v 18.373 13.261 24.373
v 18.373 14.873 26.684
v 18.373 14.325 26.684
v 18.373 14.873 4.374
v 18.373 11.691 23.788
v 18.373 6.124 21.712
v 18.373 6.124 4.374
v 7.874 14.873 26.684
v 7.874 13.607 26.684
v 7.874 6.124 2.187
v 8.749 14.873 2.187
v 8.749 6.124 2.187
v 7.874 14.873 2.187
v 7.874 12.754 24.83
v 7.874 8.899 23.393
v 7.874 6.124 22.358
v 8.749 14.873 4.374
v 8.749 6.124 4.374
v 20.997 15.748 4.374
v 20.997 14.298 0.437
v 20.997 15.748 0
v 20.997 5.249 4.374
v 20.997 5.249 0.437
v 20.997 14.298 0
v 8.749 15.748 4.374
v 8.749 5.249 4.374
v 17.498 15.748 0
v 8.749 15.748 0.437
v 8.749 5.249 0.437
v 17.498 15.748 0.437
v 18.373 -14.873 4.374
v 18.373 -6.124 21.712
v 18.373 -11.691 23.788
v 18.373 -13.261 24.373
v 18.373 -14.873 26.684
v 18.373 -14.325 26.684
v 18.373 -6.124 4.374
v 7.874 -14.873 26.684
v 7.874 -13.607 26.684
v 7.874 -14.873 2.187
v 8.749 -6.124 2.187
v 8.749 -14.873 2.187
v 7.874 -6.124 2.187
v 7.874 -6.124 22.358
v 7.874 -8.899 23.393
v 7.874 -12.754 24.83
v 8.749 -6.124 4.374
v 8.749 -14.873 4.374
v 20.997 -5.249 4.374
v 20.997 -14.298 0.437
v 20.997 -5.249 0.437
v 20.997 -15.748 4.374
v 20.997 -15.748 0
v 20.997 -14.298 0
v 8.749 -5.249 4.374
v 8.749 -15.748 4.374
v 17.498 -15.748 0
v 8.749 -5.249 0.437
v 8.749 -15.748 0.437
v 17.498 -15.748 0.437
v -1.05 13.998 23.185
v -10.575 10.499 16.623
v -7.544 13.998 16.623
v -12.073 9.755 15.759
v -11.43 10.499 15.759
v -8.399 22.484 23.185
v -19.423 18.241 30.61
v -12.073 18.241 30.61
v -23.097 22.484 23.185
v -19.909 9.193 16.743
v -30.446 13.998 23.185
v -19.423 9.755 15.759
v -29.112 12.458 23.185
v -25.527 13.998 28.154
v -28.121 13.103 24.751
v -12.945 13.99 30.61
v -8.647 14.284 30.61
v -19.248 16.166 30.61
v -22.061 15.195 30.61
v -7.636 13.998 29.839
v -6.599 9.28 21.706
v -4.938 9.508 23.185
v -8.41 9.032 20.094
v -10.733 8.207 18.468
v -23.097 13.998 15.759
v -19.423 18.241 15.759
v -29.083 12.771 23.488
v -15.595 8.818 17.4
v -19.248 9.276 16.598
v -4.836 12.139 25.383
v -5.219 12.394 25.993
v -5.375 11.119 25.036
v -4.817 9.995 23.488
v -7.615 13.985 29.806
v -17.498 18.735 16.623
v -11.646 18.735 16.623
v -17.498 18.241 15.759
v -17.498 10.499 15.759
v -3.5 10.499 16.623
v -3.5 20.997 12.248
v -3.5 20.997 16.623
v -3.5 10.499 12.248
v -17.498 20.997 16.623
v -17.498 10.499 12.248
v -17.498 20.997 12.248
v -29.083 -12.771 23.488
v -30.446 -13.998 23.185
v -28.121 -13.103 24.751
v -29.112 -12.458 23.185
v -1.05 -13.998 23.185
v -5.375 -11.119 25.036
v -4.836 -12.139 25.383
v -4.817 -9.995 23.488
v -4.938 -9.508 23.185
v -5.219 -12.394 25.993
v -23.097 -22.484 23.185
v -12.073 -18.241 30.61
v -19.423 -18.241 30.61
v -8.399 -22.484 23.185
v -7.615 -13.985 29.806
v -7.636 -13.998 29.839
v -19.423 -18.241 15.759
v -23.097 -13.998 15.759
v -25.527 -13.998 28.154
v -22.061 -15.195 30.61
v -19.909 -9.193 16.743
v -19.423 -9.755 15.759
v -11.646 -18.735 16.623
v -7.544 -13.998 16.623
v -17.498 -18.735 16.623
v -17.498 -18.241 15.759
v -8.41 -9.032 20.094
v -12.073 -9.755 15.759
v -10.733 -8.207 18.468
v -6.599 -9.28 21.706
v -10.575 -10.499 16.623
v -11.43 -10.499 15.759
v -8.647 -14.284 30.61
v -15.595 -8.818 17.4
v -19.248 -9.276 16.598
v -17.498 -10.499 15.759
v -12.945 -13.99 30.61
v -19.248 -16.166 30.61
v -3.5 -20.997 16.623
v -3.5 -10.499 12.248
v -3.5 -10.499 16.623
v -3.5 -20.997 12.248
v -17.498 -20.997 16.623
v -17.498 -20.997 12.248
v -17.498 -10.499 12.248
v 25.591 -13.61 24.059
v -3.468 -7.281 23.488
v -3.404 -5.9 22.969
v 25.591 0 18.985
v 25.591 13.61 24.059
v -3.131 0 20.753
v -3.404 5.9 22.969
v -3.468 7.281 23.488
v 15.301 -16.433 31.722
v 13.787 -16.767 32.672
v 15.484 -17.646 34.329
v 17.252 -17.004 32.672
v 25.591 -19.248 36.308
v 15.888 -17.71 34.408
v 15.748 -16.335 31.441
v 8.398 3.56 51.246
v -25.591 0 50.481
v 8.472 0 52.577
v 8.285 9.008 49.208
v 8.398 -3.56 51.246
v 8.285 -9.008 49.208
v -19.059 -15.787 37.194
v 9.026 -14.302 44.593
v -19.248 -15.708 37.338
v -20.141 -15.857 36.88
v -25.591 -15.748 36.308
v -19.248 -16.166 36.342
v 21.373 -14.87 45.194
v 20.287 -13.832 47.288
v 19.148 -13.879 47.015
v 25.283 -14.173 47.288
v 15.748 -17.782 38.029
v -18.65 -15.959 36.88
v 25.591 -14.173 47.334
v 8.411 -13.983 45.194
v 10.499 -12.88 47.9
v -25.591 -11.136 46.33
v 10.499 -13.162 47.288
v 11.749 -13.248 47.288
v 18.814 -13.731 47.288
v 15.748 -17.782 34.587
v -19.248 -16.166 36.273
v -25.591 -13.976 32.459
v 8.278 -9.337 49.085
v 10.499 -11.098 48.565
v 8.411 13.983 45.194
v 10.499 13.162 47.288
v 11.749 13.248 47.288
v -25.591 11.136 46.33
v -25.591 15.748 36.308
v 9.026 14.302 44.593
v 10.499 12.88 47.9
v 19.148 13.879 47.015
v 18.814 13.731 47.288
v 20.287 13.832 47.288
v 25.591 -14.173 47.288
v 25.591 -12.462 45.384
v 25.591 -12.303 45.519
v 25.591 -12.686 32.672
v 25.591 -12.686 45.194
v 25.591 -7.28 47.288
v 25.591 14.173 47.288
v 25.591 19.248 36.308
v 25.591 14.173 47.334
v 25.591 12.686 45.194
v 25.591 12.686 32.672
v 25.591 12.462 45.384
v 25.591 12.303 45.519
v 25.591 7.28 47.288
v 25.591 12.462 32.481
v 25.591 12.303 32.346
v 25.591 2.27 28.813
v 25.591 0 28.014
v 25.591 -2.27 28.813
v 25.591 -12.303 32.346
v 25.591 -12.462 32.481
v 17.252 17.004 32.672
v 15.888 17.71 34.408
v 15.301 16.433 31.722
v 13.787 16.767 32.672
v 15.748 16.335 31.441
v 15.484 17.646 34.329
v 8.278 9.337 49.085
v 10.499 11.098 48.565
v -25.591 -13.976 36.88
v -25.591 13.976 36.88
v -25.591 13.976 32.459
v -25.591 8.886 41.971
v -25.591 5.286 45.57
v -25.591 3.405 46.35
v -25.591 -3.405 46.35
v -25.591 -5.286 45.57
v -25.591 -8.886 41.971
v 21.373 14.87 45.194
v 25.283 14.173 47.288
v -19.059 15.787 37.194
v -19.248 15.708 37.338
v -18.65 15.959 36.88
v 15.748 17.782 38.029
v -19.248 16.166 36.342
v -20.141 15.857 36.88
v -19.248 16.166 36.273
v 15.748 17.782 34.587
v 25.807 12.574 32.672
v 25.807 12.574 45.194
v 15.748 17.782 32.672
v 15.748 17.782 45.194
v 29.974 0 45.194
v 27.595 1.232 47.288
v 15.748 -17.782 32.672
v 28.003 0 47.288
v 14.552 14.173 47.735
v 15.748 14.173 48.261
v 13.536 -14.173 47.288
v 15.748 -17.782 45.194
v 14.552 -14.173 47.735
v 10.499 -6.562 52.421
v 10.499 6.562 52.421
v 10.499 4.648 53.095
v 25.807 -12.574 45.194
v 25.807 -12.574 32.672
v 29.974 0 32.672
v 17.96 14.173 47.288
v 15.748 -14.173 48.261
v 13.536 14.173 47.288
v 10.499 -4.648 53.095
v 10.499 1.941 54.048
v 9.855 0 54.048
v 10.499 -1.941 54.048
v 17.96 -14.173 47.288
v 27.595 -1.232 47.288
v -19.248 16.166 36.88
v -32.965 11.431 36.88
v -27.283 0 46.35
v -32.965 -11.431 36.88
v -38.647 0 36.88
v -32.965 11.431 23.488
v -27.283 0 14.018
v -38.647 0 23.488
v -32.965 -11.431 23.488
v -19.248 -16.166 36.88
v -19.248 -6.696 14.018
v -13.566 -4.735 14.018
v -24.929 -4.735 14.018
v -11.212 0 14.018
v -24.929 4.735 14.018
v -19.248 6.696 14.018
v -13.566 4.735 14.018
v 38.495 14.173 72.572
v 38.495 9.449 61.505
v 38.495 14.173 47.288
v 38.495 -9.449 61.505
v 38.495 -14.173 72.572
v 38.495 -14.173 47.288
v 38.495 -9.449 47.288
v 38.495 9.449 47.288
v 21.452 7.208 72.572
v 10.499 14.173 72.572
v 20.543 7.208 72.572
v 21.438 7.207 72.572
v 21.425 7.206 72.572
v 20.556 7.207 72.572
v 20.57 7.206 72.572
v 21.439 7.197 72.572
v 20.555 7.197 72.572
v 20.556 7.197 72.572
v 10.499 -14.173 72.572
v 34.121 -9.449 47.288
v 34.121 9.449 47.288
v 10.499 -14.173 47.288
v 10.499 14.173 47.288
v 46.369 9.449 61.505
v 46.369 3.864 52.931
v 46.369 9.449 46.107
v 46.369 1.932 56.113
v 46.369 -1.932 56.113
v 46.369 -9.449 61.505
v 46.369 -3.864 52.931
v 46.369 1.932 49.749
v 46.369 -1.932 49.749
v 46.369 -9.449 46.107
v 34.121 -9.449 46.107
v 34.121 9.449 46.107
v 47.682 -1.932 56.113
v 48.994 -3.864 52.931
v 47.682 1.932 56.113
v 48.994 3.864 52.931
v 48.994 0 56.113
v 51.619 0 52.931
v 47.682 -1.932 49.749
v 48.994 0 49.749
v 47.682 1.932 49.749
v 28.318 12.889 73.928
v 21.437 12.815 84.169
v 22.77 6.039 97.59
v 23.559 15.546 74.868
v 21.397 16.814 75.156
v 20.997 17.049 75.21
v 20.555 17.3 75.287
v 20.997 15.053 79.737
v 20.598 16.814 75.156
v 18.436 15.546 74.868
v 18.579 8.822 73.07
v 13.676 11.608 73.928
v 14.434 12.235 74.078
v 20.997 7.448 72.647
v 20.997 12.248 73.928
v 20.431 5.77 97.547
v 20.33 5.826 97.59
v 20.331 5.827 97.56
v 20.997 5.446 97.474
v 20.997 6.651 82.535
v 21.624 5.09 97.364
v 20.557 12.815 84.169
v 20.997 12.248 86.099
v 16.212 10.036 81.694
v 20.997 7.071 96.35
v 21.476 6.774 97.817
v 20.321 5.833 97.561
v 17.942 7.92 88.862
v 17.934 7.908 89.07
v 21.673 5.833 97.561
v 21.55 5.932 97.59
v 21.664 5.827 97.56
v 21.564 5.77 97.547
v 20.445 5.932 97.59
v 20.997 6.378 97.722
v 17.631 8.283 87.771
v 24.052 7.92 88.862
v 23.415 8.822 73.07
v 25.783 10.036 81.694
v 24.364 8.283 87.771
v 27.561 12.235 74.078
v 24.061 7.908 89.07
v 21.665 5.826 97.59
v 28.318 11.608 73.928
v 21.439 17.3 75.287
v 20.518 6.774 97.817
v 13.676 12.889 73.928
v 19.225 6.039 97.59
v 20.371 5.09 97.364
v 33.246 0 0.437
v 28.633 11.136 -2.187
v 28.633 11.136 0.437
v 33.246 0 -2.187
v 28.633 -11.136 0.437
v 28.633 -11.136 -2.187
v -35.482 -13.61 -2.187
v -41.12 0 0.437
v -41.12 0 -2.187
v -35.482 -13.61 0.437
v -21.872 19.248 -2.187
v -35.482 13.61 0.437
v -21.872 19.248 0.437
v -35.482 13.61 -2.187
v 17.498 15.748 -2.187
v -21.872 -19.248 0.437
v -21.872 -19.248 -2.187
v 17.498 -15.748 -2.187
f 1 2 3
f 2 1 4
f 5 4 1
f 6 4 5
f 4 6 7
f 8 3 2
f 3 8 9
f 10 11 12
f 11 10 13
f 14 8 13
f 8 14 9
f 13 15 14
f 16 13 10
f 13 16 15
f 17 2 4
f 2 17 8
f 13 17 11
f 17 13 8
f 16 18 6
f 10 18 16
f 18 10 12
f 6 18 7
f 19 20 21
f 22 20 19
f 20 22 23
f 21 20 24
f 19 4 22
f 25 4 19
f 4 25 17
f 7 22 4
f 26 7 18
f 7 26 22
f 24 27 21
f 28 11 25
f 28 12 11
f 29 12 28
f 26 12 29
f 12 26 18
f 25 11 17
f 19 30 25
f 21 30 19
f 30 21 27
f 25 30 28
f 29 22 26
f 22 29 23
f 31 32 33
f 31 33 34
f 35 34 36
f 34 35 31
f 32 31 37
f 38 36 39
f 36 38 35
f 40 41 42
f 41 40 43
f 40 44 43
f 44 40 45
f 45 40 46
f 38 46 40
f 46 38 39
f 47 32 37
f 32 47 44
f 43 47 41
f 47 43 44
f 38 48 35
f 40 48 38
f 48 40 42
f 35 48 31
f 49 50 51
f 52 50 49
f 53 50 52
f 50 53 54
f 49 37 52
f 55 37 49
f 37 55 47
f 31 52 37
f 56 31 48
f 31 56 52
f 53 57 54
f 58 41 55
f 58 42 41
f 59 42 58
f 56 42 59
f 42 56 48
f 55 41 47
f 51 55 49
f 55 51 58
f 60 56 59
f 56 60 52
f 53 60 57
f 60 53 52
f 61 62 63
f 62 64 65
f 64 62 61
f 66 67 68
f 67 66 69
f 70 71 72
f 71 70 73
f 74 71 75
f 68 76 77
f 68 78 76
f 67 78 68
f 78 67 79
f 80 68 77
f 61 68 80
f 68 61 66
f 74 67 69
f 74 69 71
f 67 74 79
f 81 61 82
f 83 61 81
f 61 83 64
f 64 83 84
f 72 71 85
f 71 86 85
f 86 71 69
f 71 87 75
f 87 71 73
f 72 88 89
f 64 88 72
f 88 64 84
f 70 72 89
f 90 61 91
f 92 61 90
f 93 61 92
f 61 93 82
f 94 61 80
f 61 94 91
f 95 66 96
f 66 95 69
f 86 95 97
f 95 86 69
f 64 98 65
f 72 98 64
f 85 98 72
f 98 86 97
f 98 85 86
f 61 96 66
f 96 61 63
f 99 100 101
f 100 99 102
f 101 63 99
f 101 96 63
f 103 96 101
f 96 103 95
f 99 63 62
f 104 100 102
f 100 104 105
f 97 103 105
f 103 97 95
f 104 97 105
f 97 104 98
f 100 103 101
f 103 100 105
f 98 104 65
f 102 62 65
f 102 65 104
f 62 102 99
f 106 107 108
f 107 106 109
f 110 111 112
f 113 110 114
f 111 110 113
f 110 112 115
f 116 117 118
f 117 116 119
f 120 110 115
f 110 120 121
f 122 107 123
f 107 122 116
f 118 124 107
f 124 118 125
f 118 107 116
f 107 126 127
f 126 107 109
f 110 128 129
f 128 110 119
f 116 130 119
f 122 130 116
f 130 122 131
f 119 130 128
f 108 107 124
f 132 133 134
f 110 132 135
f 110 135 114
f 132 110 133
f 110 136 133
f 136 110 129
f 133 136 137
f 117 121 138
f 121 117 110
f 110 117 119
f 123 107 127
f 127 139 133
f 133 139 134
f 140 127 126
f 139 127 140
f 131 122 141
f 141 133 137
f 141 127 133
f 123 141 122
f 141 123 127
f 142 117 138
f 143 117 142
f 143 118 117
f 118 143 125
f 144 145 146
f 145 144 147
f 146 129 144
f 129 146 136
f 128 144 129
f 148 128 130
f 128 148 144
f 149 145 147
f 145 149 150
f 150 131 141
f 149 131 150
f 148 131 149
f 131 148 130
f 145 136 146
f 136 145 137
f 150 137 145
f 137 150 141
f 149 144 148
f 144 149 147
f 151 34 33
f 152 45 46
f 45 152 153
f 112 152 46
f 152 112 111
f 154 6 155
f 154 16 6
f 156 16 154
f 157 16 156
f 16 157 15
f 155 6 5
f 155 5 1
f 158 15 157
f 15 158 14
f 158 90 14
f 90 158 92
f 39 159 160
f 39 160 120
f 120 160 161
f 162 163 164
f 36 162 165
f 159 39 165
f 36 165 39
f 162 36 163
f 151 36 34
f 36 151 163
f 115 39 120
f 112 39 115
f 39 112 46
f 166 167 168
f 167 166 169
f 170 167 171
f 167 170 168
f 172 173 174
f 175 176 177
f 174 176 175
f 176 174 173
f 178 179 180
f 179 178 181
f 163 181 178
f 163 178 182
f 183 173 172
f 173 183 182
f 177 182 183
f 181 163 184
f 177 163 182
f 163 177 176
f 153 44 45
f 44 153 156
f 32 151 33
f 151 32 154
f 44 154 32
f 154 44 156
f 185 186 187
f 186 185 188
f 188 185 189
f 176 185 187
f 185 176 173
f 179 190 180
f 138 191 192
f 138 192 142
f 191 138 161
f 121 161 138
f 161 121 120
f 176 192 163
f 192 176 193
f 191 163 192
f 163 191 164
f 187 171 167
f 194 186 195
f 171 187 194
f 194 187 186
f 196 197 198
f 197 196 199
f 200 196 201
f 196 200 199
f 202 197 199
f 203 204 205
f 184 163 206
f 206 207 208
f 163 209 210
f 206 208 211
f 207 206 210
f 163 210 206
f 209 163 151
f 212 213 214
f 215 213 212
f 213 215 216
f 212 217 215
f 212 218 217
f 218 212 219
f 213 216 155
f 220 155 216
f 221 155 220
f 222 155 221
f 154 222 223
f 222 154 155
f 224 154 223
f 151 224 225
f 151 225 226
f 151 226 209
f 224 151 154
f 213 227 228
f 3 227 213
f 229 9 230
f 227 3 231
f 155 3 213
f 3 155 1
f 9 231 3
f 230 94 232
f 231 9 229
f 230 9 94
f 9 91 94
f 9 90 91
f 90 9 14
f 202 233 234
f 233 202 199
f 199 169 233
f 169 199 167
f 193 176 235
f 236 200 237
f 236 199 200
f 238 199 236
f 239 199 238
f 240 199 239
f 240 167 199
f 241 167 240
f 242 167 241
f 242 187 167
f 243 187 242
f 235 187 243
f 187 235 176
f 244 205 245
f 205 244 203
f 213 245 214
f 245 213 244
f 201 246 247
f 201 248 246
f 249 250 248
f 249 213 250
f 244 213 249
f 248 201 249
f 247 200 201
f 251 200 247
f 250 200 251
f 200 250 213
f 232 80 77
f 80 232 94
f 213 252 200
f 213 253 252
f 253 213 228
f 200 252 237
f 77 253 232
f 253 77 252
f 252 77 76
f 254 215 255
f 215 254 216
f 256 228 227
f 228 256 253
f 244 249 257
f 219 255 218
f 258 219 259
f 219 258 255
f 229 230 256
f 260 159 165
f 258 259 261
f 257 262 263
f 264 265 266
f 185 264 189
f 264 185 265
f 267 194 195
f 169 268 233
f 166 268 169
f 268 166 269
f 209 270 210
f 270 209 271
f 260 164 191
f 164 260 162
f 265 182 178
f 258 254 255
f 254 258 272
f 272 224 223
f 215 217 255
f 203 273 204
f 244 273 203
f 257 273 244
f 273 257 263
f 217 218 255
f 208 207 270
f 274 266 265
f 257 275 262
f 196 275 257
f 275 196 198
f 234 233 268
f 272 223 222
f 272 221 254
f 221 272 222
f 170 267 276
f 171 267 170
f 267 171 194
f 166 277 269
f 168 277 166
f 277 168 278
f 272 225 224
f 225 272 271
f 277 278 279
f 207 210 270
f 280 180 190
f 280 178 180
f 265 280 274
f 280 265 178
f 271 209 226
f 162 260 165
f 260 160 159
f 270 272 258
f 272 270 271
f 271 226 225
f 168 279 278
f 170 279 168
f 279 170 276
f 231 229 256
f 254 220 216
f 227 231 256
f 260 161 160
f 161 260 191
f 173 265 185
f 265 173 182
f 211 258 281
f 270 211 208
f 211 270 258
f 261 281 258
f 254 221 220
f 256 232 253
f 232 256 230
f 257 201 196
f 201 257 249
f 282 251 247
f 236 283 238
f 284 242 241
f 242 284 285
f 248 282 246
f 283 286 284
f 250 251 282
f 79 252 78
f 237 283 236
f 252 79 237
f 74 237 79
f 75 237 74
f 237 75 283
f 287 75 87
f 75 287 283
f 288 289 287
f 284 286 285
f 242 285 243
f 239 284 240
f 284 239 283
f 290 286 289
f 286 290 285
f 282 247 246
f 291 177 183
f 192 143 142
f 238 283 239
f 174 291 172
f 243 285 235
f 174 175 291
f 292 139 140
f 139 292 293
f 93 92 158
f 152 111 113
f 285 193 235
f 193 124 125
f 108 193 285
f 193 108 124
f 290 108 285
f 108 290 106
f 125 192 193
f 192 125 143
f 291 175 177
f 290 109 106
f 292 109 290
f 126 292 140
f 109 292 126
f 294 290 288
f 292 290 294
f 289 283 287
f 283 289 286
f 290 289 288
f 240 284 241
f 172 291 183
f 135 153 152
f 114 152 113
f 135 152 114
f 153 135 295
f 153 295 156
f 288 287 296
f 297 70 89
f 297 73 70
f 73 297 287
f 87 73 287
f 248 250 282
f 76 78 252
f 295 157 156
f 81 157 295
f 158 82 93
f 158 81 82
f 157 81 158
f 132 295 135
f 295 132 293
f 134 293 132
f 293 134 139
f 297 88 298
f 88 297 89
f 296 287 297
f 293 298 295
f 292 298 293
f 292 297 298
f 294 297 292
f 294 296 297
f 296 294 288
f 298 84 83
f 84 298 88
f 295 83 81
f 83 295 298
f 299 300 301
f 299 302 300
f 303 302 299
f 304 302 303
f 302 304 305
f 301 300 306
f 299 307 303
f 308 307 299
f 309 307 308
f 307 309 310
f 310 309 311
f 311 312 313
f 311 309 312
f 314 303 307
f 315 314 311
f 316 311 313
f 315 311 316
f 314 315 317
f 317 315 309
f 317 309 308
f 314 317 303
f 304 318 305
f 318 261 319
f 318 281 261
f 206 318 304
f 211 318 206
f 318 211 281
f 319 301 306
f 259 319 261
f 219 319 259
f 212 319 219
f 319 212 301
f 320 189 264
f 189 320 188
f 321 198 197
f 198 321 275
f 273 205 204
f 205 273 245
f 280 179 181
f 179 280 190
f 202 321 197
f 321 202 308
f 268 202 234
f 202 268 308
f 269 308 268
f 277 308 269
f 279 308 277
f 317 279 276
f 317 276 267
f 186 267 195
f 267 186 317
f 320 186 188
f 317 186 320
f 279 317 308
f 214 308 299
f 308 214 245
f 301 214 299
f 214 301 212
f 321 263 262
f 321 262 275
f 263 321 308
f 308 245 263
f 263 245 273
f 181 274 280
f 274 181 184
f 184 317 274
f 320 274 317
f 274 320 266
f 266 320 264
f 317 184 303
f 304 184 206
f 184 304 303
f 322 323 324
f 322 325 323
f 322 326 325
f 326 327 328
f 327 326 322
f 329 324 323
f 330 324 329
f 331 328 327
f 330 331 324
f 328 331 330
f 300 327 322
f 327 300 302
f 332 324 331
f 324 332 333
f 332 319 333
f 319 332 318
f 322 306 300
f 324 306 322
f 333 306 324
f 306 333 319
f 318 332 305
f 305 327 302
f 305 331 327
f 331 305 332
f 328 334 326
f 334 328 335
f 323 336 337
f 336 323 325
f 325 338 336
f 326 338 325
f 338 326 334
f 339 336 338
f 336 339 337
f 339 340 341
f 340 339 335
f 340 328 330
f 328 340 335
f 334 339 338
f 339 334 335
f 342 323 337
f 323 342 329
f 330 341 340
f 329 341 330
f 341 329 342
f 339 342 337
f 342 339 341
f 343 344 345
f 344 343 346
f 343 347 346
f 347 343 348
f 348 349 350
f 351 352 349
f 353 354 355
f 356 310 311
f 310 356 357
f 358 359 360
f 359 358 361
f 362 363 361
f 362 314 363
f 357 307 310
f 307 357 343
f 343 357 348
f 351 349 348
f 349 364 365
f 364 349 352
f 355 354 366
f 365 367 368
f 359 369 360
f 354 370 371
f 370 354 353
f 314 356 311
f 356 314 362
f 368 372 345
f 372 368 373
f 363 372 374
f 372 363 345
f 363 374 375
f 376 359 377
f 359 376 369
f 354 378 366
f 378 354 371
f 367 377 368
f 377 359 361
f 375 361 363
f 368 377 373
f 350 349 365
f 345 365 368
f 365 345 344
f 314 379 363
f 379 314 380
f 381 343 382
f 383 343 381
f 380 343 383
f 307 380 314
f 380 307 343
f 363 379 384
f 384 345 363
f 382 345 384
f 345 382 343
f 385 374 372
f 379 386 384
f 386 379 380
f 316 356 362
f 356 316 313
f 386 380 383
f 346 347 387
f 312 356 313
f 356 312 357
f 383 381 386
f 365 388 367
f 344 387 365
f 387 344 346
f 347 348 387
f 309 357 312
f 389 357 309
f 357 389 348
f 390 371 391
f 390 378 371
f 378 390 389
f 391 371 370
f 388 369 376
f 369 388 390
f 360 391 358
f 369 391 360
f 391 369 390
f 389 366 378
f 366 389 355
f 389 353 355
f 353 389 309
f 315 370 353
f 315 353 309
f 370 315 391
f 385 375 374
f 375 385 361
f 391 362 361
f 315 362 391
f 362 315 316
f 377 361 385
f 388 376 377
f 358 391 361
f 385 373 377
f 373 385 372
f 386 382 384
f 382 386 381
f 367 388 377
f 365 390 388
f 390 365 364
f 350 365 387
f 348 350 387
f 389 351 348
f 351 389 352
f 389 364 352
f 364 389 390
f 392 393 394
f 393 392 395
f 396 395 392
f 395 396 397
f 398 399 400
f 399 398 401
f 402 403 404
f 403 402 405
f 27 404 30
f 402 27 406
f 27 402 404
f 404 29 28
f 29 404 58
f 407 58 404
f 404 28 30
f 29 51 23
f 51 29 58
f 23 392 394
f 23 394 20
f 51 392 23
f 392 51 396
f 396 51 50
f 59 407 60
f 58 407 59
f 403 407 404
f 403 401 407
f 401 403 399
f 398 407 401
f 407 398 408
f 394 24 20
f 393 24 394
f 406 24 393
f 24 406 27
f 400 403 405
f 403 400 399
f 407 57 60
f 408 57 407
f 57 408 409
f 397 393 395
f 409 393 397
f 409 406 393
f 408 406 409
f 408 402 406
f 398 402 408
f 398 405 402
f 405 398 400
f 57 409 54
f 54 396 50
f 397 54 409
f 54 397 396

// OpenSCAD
// Low-poly French Bulldog - Seated - Origami Style
// All dimensions in mm, ~100mm tall
// Dog faces +X direction

$fn = 6; // Low poly! Keep facets visible

module body() {
    // Barrel-shaped torso, wider at chest
    translate([0, 0, 25])
    scale([1.3, 1, 0.9])
    rotate([0, 90, 0])
    cylinder(h=45, r1=18, r2=22, center=true, $fn=8);
}

module chest() {
    // Front chest bump
    translate([18, 0, 28])
    scale([0.8, 1, 0.85])
    sphere(r=22, $fn=8);
}

module rump() {
    // Rear seated rump
    translate([-22, 0, 18])
    scale([1.2, 1, 1])
    sphere(r=20, $fn=8);
}

module head() {
    // Large boxy head
    translate([28, 0, 52]) {
        // Main head block
        scale([1, 0.9, 0.85])
        cube([32, 36, 34], center=true);
    }
}

module muzzle() {
    // Short flat snout
    translate([46, 0, 45]) {
        scale([1, 0.9, 0.8])
        cube([14, 24, 22], center=true);
    }
}

module nose_bump() {
    translate([53, 0, 44])
    scale([1, 0.85, 0.7])
    sphere(r=6, $fn=6);
}

module ear(side) {
    // Bat ear - tall triangle
    mirror([0, side < 0 ? 1 : 0, 0])
    translate([24, side * 14, 68]) {
        rotate([side * 15, 0, 5])
        scale([0.7, 0.5, 1])
        cylinder(h=28, r1=12, r2=2, $fn=4);
    }
}

module front_leg(side) {
    translate([15, side * 12, 0]) {
        // Upper leg
        cube([12, 10, 28], center=true);
        // Paw
        translate([2, 0, -14])
        cube([14, 12, 5], center=true);
    }
}

module rear_leg(side) {
    // Folded haunch
    translate([-18, side * 16, 10]) {
        scale([1.2, 0.8, 0.7])
        sphere(r=14, $fn=6);
    }
    // Rear paw
    translate([-12, side * 18, 0])
    cube([16, 12, 5], center=true);
}

module tail() {
    translate([-32, 0, 22])
    rotate([0, -30, 0])
    scale([1, 0.8, 0.8])
    cylinder(h=8, r1=5, r2=2, $fn=5);
}

module base_plate() {
    // Flat base for printing
    translate([0, 0, -2.5])
    hull() {
        translate([20, 0, 0]) cylinder(h=3, r=18, $fn=8);
        translate([-25, 0, 0]) cylinder(h=3, r=22, $fn=8);
    }
}

// === ASSEMBLE ===
// Scale to ~100mm tall
scale_factor = 100 / 114.3;

scale([scale_factor, scale_factor, scale_factor]) {
    translate([0, 0, 16.5]) {
        union() {
            body();
            chest();
            rump();
            head();
            muzzle();
            nose_bump();
            ear(1);
            ear(-1);
            front_leg(1);
            front_leg(-1);
            rear_leg(1);
            rear_leg(-1);
            tail();
        }
    }
    base_plate();
}
